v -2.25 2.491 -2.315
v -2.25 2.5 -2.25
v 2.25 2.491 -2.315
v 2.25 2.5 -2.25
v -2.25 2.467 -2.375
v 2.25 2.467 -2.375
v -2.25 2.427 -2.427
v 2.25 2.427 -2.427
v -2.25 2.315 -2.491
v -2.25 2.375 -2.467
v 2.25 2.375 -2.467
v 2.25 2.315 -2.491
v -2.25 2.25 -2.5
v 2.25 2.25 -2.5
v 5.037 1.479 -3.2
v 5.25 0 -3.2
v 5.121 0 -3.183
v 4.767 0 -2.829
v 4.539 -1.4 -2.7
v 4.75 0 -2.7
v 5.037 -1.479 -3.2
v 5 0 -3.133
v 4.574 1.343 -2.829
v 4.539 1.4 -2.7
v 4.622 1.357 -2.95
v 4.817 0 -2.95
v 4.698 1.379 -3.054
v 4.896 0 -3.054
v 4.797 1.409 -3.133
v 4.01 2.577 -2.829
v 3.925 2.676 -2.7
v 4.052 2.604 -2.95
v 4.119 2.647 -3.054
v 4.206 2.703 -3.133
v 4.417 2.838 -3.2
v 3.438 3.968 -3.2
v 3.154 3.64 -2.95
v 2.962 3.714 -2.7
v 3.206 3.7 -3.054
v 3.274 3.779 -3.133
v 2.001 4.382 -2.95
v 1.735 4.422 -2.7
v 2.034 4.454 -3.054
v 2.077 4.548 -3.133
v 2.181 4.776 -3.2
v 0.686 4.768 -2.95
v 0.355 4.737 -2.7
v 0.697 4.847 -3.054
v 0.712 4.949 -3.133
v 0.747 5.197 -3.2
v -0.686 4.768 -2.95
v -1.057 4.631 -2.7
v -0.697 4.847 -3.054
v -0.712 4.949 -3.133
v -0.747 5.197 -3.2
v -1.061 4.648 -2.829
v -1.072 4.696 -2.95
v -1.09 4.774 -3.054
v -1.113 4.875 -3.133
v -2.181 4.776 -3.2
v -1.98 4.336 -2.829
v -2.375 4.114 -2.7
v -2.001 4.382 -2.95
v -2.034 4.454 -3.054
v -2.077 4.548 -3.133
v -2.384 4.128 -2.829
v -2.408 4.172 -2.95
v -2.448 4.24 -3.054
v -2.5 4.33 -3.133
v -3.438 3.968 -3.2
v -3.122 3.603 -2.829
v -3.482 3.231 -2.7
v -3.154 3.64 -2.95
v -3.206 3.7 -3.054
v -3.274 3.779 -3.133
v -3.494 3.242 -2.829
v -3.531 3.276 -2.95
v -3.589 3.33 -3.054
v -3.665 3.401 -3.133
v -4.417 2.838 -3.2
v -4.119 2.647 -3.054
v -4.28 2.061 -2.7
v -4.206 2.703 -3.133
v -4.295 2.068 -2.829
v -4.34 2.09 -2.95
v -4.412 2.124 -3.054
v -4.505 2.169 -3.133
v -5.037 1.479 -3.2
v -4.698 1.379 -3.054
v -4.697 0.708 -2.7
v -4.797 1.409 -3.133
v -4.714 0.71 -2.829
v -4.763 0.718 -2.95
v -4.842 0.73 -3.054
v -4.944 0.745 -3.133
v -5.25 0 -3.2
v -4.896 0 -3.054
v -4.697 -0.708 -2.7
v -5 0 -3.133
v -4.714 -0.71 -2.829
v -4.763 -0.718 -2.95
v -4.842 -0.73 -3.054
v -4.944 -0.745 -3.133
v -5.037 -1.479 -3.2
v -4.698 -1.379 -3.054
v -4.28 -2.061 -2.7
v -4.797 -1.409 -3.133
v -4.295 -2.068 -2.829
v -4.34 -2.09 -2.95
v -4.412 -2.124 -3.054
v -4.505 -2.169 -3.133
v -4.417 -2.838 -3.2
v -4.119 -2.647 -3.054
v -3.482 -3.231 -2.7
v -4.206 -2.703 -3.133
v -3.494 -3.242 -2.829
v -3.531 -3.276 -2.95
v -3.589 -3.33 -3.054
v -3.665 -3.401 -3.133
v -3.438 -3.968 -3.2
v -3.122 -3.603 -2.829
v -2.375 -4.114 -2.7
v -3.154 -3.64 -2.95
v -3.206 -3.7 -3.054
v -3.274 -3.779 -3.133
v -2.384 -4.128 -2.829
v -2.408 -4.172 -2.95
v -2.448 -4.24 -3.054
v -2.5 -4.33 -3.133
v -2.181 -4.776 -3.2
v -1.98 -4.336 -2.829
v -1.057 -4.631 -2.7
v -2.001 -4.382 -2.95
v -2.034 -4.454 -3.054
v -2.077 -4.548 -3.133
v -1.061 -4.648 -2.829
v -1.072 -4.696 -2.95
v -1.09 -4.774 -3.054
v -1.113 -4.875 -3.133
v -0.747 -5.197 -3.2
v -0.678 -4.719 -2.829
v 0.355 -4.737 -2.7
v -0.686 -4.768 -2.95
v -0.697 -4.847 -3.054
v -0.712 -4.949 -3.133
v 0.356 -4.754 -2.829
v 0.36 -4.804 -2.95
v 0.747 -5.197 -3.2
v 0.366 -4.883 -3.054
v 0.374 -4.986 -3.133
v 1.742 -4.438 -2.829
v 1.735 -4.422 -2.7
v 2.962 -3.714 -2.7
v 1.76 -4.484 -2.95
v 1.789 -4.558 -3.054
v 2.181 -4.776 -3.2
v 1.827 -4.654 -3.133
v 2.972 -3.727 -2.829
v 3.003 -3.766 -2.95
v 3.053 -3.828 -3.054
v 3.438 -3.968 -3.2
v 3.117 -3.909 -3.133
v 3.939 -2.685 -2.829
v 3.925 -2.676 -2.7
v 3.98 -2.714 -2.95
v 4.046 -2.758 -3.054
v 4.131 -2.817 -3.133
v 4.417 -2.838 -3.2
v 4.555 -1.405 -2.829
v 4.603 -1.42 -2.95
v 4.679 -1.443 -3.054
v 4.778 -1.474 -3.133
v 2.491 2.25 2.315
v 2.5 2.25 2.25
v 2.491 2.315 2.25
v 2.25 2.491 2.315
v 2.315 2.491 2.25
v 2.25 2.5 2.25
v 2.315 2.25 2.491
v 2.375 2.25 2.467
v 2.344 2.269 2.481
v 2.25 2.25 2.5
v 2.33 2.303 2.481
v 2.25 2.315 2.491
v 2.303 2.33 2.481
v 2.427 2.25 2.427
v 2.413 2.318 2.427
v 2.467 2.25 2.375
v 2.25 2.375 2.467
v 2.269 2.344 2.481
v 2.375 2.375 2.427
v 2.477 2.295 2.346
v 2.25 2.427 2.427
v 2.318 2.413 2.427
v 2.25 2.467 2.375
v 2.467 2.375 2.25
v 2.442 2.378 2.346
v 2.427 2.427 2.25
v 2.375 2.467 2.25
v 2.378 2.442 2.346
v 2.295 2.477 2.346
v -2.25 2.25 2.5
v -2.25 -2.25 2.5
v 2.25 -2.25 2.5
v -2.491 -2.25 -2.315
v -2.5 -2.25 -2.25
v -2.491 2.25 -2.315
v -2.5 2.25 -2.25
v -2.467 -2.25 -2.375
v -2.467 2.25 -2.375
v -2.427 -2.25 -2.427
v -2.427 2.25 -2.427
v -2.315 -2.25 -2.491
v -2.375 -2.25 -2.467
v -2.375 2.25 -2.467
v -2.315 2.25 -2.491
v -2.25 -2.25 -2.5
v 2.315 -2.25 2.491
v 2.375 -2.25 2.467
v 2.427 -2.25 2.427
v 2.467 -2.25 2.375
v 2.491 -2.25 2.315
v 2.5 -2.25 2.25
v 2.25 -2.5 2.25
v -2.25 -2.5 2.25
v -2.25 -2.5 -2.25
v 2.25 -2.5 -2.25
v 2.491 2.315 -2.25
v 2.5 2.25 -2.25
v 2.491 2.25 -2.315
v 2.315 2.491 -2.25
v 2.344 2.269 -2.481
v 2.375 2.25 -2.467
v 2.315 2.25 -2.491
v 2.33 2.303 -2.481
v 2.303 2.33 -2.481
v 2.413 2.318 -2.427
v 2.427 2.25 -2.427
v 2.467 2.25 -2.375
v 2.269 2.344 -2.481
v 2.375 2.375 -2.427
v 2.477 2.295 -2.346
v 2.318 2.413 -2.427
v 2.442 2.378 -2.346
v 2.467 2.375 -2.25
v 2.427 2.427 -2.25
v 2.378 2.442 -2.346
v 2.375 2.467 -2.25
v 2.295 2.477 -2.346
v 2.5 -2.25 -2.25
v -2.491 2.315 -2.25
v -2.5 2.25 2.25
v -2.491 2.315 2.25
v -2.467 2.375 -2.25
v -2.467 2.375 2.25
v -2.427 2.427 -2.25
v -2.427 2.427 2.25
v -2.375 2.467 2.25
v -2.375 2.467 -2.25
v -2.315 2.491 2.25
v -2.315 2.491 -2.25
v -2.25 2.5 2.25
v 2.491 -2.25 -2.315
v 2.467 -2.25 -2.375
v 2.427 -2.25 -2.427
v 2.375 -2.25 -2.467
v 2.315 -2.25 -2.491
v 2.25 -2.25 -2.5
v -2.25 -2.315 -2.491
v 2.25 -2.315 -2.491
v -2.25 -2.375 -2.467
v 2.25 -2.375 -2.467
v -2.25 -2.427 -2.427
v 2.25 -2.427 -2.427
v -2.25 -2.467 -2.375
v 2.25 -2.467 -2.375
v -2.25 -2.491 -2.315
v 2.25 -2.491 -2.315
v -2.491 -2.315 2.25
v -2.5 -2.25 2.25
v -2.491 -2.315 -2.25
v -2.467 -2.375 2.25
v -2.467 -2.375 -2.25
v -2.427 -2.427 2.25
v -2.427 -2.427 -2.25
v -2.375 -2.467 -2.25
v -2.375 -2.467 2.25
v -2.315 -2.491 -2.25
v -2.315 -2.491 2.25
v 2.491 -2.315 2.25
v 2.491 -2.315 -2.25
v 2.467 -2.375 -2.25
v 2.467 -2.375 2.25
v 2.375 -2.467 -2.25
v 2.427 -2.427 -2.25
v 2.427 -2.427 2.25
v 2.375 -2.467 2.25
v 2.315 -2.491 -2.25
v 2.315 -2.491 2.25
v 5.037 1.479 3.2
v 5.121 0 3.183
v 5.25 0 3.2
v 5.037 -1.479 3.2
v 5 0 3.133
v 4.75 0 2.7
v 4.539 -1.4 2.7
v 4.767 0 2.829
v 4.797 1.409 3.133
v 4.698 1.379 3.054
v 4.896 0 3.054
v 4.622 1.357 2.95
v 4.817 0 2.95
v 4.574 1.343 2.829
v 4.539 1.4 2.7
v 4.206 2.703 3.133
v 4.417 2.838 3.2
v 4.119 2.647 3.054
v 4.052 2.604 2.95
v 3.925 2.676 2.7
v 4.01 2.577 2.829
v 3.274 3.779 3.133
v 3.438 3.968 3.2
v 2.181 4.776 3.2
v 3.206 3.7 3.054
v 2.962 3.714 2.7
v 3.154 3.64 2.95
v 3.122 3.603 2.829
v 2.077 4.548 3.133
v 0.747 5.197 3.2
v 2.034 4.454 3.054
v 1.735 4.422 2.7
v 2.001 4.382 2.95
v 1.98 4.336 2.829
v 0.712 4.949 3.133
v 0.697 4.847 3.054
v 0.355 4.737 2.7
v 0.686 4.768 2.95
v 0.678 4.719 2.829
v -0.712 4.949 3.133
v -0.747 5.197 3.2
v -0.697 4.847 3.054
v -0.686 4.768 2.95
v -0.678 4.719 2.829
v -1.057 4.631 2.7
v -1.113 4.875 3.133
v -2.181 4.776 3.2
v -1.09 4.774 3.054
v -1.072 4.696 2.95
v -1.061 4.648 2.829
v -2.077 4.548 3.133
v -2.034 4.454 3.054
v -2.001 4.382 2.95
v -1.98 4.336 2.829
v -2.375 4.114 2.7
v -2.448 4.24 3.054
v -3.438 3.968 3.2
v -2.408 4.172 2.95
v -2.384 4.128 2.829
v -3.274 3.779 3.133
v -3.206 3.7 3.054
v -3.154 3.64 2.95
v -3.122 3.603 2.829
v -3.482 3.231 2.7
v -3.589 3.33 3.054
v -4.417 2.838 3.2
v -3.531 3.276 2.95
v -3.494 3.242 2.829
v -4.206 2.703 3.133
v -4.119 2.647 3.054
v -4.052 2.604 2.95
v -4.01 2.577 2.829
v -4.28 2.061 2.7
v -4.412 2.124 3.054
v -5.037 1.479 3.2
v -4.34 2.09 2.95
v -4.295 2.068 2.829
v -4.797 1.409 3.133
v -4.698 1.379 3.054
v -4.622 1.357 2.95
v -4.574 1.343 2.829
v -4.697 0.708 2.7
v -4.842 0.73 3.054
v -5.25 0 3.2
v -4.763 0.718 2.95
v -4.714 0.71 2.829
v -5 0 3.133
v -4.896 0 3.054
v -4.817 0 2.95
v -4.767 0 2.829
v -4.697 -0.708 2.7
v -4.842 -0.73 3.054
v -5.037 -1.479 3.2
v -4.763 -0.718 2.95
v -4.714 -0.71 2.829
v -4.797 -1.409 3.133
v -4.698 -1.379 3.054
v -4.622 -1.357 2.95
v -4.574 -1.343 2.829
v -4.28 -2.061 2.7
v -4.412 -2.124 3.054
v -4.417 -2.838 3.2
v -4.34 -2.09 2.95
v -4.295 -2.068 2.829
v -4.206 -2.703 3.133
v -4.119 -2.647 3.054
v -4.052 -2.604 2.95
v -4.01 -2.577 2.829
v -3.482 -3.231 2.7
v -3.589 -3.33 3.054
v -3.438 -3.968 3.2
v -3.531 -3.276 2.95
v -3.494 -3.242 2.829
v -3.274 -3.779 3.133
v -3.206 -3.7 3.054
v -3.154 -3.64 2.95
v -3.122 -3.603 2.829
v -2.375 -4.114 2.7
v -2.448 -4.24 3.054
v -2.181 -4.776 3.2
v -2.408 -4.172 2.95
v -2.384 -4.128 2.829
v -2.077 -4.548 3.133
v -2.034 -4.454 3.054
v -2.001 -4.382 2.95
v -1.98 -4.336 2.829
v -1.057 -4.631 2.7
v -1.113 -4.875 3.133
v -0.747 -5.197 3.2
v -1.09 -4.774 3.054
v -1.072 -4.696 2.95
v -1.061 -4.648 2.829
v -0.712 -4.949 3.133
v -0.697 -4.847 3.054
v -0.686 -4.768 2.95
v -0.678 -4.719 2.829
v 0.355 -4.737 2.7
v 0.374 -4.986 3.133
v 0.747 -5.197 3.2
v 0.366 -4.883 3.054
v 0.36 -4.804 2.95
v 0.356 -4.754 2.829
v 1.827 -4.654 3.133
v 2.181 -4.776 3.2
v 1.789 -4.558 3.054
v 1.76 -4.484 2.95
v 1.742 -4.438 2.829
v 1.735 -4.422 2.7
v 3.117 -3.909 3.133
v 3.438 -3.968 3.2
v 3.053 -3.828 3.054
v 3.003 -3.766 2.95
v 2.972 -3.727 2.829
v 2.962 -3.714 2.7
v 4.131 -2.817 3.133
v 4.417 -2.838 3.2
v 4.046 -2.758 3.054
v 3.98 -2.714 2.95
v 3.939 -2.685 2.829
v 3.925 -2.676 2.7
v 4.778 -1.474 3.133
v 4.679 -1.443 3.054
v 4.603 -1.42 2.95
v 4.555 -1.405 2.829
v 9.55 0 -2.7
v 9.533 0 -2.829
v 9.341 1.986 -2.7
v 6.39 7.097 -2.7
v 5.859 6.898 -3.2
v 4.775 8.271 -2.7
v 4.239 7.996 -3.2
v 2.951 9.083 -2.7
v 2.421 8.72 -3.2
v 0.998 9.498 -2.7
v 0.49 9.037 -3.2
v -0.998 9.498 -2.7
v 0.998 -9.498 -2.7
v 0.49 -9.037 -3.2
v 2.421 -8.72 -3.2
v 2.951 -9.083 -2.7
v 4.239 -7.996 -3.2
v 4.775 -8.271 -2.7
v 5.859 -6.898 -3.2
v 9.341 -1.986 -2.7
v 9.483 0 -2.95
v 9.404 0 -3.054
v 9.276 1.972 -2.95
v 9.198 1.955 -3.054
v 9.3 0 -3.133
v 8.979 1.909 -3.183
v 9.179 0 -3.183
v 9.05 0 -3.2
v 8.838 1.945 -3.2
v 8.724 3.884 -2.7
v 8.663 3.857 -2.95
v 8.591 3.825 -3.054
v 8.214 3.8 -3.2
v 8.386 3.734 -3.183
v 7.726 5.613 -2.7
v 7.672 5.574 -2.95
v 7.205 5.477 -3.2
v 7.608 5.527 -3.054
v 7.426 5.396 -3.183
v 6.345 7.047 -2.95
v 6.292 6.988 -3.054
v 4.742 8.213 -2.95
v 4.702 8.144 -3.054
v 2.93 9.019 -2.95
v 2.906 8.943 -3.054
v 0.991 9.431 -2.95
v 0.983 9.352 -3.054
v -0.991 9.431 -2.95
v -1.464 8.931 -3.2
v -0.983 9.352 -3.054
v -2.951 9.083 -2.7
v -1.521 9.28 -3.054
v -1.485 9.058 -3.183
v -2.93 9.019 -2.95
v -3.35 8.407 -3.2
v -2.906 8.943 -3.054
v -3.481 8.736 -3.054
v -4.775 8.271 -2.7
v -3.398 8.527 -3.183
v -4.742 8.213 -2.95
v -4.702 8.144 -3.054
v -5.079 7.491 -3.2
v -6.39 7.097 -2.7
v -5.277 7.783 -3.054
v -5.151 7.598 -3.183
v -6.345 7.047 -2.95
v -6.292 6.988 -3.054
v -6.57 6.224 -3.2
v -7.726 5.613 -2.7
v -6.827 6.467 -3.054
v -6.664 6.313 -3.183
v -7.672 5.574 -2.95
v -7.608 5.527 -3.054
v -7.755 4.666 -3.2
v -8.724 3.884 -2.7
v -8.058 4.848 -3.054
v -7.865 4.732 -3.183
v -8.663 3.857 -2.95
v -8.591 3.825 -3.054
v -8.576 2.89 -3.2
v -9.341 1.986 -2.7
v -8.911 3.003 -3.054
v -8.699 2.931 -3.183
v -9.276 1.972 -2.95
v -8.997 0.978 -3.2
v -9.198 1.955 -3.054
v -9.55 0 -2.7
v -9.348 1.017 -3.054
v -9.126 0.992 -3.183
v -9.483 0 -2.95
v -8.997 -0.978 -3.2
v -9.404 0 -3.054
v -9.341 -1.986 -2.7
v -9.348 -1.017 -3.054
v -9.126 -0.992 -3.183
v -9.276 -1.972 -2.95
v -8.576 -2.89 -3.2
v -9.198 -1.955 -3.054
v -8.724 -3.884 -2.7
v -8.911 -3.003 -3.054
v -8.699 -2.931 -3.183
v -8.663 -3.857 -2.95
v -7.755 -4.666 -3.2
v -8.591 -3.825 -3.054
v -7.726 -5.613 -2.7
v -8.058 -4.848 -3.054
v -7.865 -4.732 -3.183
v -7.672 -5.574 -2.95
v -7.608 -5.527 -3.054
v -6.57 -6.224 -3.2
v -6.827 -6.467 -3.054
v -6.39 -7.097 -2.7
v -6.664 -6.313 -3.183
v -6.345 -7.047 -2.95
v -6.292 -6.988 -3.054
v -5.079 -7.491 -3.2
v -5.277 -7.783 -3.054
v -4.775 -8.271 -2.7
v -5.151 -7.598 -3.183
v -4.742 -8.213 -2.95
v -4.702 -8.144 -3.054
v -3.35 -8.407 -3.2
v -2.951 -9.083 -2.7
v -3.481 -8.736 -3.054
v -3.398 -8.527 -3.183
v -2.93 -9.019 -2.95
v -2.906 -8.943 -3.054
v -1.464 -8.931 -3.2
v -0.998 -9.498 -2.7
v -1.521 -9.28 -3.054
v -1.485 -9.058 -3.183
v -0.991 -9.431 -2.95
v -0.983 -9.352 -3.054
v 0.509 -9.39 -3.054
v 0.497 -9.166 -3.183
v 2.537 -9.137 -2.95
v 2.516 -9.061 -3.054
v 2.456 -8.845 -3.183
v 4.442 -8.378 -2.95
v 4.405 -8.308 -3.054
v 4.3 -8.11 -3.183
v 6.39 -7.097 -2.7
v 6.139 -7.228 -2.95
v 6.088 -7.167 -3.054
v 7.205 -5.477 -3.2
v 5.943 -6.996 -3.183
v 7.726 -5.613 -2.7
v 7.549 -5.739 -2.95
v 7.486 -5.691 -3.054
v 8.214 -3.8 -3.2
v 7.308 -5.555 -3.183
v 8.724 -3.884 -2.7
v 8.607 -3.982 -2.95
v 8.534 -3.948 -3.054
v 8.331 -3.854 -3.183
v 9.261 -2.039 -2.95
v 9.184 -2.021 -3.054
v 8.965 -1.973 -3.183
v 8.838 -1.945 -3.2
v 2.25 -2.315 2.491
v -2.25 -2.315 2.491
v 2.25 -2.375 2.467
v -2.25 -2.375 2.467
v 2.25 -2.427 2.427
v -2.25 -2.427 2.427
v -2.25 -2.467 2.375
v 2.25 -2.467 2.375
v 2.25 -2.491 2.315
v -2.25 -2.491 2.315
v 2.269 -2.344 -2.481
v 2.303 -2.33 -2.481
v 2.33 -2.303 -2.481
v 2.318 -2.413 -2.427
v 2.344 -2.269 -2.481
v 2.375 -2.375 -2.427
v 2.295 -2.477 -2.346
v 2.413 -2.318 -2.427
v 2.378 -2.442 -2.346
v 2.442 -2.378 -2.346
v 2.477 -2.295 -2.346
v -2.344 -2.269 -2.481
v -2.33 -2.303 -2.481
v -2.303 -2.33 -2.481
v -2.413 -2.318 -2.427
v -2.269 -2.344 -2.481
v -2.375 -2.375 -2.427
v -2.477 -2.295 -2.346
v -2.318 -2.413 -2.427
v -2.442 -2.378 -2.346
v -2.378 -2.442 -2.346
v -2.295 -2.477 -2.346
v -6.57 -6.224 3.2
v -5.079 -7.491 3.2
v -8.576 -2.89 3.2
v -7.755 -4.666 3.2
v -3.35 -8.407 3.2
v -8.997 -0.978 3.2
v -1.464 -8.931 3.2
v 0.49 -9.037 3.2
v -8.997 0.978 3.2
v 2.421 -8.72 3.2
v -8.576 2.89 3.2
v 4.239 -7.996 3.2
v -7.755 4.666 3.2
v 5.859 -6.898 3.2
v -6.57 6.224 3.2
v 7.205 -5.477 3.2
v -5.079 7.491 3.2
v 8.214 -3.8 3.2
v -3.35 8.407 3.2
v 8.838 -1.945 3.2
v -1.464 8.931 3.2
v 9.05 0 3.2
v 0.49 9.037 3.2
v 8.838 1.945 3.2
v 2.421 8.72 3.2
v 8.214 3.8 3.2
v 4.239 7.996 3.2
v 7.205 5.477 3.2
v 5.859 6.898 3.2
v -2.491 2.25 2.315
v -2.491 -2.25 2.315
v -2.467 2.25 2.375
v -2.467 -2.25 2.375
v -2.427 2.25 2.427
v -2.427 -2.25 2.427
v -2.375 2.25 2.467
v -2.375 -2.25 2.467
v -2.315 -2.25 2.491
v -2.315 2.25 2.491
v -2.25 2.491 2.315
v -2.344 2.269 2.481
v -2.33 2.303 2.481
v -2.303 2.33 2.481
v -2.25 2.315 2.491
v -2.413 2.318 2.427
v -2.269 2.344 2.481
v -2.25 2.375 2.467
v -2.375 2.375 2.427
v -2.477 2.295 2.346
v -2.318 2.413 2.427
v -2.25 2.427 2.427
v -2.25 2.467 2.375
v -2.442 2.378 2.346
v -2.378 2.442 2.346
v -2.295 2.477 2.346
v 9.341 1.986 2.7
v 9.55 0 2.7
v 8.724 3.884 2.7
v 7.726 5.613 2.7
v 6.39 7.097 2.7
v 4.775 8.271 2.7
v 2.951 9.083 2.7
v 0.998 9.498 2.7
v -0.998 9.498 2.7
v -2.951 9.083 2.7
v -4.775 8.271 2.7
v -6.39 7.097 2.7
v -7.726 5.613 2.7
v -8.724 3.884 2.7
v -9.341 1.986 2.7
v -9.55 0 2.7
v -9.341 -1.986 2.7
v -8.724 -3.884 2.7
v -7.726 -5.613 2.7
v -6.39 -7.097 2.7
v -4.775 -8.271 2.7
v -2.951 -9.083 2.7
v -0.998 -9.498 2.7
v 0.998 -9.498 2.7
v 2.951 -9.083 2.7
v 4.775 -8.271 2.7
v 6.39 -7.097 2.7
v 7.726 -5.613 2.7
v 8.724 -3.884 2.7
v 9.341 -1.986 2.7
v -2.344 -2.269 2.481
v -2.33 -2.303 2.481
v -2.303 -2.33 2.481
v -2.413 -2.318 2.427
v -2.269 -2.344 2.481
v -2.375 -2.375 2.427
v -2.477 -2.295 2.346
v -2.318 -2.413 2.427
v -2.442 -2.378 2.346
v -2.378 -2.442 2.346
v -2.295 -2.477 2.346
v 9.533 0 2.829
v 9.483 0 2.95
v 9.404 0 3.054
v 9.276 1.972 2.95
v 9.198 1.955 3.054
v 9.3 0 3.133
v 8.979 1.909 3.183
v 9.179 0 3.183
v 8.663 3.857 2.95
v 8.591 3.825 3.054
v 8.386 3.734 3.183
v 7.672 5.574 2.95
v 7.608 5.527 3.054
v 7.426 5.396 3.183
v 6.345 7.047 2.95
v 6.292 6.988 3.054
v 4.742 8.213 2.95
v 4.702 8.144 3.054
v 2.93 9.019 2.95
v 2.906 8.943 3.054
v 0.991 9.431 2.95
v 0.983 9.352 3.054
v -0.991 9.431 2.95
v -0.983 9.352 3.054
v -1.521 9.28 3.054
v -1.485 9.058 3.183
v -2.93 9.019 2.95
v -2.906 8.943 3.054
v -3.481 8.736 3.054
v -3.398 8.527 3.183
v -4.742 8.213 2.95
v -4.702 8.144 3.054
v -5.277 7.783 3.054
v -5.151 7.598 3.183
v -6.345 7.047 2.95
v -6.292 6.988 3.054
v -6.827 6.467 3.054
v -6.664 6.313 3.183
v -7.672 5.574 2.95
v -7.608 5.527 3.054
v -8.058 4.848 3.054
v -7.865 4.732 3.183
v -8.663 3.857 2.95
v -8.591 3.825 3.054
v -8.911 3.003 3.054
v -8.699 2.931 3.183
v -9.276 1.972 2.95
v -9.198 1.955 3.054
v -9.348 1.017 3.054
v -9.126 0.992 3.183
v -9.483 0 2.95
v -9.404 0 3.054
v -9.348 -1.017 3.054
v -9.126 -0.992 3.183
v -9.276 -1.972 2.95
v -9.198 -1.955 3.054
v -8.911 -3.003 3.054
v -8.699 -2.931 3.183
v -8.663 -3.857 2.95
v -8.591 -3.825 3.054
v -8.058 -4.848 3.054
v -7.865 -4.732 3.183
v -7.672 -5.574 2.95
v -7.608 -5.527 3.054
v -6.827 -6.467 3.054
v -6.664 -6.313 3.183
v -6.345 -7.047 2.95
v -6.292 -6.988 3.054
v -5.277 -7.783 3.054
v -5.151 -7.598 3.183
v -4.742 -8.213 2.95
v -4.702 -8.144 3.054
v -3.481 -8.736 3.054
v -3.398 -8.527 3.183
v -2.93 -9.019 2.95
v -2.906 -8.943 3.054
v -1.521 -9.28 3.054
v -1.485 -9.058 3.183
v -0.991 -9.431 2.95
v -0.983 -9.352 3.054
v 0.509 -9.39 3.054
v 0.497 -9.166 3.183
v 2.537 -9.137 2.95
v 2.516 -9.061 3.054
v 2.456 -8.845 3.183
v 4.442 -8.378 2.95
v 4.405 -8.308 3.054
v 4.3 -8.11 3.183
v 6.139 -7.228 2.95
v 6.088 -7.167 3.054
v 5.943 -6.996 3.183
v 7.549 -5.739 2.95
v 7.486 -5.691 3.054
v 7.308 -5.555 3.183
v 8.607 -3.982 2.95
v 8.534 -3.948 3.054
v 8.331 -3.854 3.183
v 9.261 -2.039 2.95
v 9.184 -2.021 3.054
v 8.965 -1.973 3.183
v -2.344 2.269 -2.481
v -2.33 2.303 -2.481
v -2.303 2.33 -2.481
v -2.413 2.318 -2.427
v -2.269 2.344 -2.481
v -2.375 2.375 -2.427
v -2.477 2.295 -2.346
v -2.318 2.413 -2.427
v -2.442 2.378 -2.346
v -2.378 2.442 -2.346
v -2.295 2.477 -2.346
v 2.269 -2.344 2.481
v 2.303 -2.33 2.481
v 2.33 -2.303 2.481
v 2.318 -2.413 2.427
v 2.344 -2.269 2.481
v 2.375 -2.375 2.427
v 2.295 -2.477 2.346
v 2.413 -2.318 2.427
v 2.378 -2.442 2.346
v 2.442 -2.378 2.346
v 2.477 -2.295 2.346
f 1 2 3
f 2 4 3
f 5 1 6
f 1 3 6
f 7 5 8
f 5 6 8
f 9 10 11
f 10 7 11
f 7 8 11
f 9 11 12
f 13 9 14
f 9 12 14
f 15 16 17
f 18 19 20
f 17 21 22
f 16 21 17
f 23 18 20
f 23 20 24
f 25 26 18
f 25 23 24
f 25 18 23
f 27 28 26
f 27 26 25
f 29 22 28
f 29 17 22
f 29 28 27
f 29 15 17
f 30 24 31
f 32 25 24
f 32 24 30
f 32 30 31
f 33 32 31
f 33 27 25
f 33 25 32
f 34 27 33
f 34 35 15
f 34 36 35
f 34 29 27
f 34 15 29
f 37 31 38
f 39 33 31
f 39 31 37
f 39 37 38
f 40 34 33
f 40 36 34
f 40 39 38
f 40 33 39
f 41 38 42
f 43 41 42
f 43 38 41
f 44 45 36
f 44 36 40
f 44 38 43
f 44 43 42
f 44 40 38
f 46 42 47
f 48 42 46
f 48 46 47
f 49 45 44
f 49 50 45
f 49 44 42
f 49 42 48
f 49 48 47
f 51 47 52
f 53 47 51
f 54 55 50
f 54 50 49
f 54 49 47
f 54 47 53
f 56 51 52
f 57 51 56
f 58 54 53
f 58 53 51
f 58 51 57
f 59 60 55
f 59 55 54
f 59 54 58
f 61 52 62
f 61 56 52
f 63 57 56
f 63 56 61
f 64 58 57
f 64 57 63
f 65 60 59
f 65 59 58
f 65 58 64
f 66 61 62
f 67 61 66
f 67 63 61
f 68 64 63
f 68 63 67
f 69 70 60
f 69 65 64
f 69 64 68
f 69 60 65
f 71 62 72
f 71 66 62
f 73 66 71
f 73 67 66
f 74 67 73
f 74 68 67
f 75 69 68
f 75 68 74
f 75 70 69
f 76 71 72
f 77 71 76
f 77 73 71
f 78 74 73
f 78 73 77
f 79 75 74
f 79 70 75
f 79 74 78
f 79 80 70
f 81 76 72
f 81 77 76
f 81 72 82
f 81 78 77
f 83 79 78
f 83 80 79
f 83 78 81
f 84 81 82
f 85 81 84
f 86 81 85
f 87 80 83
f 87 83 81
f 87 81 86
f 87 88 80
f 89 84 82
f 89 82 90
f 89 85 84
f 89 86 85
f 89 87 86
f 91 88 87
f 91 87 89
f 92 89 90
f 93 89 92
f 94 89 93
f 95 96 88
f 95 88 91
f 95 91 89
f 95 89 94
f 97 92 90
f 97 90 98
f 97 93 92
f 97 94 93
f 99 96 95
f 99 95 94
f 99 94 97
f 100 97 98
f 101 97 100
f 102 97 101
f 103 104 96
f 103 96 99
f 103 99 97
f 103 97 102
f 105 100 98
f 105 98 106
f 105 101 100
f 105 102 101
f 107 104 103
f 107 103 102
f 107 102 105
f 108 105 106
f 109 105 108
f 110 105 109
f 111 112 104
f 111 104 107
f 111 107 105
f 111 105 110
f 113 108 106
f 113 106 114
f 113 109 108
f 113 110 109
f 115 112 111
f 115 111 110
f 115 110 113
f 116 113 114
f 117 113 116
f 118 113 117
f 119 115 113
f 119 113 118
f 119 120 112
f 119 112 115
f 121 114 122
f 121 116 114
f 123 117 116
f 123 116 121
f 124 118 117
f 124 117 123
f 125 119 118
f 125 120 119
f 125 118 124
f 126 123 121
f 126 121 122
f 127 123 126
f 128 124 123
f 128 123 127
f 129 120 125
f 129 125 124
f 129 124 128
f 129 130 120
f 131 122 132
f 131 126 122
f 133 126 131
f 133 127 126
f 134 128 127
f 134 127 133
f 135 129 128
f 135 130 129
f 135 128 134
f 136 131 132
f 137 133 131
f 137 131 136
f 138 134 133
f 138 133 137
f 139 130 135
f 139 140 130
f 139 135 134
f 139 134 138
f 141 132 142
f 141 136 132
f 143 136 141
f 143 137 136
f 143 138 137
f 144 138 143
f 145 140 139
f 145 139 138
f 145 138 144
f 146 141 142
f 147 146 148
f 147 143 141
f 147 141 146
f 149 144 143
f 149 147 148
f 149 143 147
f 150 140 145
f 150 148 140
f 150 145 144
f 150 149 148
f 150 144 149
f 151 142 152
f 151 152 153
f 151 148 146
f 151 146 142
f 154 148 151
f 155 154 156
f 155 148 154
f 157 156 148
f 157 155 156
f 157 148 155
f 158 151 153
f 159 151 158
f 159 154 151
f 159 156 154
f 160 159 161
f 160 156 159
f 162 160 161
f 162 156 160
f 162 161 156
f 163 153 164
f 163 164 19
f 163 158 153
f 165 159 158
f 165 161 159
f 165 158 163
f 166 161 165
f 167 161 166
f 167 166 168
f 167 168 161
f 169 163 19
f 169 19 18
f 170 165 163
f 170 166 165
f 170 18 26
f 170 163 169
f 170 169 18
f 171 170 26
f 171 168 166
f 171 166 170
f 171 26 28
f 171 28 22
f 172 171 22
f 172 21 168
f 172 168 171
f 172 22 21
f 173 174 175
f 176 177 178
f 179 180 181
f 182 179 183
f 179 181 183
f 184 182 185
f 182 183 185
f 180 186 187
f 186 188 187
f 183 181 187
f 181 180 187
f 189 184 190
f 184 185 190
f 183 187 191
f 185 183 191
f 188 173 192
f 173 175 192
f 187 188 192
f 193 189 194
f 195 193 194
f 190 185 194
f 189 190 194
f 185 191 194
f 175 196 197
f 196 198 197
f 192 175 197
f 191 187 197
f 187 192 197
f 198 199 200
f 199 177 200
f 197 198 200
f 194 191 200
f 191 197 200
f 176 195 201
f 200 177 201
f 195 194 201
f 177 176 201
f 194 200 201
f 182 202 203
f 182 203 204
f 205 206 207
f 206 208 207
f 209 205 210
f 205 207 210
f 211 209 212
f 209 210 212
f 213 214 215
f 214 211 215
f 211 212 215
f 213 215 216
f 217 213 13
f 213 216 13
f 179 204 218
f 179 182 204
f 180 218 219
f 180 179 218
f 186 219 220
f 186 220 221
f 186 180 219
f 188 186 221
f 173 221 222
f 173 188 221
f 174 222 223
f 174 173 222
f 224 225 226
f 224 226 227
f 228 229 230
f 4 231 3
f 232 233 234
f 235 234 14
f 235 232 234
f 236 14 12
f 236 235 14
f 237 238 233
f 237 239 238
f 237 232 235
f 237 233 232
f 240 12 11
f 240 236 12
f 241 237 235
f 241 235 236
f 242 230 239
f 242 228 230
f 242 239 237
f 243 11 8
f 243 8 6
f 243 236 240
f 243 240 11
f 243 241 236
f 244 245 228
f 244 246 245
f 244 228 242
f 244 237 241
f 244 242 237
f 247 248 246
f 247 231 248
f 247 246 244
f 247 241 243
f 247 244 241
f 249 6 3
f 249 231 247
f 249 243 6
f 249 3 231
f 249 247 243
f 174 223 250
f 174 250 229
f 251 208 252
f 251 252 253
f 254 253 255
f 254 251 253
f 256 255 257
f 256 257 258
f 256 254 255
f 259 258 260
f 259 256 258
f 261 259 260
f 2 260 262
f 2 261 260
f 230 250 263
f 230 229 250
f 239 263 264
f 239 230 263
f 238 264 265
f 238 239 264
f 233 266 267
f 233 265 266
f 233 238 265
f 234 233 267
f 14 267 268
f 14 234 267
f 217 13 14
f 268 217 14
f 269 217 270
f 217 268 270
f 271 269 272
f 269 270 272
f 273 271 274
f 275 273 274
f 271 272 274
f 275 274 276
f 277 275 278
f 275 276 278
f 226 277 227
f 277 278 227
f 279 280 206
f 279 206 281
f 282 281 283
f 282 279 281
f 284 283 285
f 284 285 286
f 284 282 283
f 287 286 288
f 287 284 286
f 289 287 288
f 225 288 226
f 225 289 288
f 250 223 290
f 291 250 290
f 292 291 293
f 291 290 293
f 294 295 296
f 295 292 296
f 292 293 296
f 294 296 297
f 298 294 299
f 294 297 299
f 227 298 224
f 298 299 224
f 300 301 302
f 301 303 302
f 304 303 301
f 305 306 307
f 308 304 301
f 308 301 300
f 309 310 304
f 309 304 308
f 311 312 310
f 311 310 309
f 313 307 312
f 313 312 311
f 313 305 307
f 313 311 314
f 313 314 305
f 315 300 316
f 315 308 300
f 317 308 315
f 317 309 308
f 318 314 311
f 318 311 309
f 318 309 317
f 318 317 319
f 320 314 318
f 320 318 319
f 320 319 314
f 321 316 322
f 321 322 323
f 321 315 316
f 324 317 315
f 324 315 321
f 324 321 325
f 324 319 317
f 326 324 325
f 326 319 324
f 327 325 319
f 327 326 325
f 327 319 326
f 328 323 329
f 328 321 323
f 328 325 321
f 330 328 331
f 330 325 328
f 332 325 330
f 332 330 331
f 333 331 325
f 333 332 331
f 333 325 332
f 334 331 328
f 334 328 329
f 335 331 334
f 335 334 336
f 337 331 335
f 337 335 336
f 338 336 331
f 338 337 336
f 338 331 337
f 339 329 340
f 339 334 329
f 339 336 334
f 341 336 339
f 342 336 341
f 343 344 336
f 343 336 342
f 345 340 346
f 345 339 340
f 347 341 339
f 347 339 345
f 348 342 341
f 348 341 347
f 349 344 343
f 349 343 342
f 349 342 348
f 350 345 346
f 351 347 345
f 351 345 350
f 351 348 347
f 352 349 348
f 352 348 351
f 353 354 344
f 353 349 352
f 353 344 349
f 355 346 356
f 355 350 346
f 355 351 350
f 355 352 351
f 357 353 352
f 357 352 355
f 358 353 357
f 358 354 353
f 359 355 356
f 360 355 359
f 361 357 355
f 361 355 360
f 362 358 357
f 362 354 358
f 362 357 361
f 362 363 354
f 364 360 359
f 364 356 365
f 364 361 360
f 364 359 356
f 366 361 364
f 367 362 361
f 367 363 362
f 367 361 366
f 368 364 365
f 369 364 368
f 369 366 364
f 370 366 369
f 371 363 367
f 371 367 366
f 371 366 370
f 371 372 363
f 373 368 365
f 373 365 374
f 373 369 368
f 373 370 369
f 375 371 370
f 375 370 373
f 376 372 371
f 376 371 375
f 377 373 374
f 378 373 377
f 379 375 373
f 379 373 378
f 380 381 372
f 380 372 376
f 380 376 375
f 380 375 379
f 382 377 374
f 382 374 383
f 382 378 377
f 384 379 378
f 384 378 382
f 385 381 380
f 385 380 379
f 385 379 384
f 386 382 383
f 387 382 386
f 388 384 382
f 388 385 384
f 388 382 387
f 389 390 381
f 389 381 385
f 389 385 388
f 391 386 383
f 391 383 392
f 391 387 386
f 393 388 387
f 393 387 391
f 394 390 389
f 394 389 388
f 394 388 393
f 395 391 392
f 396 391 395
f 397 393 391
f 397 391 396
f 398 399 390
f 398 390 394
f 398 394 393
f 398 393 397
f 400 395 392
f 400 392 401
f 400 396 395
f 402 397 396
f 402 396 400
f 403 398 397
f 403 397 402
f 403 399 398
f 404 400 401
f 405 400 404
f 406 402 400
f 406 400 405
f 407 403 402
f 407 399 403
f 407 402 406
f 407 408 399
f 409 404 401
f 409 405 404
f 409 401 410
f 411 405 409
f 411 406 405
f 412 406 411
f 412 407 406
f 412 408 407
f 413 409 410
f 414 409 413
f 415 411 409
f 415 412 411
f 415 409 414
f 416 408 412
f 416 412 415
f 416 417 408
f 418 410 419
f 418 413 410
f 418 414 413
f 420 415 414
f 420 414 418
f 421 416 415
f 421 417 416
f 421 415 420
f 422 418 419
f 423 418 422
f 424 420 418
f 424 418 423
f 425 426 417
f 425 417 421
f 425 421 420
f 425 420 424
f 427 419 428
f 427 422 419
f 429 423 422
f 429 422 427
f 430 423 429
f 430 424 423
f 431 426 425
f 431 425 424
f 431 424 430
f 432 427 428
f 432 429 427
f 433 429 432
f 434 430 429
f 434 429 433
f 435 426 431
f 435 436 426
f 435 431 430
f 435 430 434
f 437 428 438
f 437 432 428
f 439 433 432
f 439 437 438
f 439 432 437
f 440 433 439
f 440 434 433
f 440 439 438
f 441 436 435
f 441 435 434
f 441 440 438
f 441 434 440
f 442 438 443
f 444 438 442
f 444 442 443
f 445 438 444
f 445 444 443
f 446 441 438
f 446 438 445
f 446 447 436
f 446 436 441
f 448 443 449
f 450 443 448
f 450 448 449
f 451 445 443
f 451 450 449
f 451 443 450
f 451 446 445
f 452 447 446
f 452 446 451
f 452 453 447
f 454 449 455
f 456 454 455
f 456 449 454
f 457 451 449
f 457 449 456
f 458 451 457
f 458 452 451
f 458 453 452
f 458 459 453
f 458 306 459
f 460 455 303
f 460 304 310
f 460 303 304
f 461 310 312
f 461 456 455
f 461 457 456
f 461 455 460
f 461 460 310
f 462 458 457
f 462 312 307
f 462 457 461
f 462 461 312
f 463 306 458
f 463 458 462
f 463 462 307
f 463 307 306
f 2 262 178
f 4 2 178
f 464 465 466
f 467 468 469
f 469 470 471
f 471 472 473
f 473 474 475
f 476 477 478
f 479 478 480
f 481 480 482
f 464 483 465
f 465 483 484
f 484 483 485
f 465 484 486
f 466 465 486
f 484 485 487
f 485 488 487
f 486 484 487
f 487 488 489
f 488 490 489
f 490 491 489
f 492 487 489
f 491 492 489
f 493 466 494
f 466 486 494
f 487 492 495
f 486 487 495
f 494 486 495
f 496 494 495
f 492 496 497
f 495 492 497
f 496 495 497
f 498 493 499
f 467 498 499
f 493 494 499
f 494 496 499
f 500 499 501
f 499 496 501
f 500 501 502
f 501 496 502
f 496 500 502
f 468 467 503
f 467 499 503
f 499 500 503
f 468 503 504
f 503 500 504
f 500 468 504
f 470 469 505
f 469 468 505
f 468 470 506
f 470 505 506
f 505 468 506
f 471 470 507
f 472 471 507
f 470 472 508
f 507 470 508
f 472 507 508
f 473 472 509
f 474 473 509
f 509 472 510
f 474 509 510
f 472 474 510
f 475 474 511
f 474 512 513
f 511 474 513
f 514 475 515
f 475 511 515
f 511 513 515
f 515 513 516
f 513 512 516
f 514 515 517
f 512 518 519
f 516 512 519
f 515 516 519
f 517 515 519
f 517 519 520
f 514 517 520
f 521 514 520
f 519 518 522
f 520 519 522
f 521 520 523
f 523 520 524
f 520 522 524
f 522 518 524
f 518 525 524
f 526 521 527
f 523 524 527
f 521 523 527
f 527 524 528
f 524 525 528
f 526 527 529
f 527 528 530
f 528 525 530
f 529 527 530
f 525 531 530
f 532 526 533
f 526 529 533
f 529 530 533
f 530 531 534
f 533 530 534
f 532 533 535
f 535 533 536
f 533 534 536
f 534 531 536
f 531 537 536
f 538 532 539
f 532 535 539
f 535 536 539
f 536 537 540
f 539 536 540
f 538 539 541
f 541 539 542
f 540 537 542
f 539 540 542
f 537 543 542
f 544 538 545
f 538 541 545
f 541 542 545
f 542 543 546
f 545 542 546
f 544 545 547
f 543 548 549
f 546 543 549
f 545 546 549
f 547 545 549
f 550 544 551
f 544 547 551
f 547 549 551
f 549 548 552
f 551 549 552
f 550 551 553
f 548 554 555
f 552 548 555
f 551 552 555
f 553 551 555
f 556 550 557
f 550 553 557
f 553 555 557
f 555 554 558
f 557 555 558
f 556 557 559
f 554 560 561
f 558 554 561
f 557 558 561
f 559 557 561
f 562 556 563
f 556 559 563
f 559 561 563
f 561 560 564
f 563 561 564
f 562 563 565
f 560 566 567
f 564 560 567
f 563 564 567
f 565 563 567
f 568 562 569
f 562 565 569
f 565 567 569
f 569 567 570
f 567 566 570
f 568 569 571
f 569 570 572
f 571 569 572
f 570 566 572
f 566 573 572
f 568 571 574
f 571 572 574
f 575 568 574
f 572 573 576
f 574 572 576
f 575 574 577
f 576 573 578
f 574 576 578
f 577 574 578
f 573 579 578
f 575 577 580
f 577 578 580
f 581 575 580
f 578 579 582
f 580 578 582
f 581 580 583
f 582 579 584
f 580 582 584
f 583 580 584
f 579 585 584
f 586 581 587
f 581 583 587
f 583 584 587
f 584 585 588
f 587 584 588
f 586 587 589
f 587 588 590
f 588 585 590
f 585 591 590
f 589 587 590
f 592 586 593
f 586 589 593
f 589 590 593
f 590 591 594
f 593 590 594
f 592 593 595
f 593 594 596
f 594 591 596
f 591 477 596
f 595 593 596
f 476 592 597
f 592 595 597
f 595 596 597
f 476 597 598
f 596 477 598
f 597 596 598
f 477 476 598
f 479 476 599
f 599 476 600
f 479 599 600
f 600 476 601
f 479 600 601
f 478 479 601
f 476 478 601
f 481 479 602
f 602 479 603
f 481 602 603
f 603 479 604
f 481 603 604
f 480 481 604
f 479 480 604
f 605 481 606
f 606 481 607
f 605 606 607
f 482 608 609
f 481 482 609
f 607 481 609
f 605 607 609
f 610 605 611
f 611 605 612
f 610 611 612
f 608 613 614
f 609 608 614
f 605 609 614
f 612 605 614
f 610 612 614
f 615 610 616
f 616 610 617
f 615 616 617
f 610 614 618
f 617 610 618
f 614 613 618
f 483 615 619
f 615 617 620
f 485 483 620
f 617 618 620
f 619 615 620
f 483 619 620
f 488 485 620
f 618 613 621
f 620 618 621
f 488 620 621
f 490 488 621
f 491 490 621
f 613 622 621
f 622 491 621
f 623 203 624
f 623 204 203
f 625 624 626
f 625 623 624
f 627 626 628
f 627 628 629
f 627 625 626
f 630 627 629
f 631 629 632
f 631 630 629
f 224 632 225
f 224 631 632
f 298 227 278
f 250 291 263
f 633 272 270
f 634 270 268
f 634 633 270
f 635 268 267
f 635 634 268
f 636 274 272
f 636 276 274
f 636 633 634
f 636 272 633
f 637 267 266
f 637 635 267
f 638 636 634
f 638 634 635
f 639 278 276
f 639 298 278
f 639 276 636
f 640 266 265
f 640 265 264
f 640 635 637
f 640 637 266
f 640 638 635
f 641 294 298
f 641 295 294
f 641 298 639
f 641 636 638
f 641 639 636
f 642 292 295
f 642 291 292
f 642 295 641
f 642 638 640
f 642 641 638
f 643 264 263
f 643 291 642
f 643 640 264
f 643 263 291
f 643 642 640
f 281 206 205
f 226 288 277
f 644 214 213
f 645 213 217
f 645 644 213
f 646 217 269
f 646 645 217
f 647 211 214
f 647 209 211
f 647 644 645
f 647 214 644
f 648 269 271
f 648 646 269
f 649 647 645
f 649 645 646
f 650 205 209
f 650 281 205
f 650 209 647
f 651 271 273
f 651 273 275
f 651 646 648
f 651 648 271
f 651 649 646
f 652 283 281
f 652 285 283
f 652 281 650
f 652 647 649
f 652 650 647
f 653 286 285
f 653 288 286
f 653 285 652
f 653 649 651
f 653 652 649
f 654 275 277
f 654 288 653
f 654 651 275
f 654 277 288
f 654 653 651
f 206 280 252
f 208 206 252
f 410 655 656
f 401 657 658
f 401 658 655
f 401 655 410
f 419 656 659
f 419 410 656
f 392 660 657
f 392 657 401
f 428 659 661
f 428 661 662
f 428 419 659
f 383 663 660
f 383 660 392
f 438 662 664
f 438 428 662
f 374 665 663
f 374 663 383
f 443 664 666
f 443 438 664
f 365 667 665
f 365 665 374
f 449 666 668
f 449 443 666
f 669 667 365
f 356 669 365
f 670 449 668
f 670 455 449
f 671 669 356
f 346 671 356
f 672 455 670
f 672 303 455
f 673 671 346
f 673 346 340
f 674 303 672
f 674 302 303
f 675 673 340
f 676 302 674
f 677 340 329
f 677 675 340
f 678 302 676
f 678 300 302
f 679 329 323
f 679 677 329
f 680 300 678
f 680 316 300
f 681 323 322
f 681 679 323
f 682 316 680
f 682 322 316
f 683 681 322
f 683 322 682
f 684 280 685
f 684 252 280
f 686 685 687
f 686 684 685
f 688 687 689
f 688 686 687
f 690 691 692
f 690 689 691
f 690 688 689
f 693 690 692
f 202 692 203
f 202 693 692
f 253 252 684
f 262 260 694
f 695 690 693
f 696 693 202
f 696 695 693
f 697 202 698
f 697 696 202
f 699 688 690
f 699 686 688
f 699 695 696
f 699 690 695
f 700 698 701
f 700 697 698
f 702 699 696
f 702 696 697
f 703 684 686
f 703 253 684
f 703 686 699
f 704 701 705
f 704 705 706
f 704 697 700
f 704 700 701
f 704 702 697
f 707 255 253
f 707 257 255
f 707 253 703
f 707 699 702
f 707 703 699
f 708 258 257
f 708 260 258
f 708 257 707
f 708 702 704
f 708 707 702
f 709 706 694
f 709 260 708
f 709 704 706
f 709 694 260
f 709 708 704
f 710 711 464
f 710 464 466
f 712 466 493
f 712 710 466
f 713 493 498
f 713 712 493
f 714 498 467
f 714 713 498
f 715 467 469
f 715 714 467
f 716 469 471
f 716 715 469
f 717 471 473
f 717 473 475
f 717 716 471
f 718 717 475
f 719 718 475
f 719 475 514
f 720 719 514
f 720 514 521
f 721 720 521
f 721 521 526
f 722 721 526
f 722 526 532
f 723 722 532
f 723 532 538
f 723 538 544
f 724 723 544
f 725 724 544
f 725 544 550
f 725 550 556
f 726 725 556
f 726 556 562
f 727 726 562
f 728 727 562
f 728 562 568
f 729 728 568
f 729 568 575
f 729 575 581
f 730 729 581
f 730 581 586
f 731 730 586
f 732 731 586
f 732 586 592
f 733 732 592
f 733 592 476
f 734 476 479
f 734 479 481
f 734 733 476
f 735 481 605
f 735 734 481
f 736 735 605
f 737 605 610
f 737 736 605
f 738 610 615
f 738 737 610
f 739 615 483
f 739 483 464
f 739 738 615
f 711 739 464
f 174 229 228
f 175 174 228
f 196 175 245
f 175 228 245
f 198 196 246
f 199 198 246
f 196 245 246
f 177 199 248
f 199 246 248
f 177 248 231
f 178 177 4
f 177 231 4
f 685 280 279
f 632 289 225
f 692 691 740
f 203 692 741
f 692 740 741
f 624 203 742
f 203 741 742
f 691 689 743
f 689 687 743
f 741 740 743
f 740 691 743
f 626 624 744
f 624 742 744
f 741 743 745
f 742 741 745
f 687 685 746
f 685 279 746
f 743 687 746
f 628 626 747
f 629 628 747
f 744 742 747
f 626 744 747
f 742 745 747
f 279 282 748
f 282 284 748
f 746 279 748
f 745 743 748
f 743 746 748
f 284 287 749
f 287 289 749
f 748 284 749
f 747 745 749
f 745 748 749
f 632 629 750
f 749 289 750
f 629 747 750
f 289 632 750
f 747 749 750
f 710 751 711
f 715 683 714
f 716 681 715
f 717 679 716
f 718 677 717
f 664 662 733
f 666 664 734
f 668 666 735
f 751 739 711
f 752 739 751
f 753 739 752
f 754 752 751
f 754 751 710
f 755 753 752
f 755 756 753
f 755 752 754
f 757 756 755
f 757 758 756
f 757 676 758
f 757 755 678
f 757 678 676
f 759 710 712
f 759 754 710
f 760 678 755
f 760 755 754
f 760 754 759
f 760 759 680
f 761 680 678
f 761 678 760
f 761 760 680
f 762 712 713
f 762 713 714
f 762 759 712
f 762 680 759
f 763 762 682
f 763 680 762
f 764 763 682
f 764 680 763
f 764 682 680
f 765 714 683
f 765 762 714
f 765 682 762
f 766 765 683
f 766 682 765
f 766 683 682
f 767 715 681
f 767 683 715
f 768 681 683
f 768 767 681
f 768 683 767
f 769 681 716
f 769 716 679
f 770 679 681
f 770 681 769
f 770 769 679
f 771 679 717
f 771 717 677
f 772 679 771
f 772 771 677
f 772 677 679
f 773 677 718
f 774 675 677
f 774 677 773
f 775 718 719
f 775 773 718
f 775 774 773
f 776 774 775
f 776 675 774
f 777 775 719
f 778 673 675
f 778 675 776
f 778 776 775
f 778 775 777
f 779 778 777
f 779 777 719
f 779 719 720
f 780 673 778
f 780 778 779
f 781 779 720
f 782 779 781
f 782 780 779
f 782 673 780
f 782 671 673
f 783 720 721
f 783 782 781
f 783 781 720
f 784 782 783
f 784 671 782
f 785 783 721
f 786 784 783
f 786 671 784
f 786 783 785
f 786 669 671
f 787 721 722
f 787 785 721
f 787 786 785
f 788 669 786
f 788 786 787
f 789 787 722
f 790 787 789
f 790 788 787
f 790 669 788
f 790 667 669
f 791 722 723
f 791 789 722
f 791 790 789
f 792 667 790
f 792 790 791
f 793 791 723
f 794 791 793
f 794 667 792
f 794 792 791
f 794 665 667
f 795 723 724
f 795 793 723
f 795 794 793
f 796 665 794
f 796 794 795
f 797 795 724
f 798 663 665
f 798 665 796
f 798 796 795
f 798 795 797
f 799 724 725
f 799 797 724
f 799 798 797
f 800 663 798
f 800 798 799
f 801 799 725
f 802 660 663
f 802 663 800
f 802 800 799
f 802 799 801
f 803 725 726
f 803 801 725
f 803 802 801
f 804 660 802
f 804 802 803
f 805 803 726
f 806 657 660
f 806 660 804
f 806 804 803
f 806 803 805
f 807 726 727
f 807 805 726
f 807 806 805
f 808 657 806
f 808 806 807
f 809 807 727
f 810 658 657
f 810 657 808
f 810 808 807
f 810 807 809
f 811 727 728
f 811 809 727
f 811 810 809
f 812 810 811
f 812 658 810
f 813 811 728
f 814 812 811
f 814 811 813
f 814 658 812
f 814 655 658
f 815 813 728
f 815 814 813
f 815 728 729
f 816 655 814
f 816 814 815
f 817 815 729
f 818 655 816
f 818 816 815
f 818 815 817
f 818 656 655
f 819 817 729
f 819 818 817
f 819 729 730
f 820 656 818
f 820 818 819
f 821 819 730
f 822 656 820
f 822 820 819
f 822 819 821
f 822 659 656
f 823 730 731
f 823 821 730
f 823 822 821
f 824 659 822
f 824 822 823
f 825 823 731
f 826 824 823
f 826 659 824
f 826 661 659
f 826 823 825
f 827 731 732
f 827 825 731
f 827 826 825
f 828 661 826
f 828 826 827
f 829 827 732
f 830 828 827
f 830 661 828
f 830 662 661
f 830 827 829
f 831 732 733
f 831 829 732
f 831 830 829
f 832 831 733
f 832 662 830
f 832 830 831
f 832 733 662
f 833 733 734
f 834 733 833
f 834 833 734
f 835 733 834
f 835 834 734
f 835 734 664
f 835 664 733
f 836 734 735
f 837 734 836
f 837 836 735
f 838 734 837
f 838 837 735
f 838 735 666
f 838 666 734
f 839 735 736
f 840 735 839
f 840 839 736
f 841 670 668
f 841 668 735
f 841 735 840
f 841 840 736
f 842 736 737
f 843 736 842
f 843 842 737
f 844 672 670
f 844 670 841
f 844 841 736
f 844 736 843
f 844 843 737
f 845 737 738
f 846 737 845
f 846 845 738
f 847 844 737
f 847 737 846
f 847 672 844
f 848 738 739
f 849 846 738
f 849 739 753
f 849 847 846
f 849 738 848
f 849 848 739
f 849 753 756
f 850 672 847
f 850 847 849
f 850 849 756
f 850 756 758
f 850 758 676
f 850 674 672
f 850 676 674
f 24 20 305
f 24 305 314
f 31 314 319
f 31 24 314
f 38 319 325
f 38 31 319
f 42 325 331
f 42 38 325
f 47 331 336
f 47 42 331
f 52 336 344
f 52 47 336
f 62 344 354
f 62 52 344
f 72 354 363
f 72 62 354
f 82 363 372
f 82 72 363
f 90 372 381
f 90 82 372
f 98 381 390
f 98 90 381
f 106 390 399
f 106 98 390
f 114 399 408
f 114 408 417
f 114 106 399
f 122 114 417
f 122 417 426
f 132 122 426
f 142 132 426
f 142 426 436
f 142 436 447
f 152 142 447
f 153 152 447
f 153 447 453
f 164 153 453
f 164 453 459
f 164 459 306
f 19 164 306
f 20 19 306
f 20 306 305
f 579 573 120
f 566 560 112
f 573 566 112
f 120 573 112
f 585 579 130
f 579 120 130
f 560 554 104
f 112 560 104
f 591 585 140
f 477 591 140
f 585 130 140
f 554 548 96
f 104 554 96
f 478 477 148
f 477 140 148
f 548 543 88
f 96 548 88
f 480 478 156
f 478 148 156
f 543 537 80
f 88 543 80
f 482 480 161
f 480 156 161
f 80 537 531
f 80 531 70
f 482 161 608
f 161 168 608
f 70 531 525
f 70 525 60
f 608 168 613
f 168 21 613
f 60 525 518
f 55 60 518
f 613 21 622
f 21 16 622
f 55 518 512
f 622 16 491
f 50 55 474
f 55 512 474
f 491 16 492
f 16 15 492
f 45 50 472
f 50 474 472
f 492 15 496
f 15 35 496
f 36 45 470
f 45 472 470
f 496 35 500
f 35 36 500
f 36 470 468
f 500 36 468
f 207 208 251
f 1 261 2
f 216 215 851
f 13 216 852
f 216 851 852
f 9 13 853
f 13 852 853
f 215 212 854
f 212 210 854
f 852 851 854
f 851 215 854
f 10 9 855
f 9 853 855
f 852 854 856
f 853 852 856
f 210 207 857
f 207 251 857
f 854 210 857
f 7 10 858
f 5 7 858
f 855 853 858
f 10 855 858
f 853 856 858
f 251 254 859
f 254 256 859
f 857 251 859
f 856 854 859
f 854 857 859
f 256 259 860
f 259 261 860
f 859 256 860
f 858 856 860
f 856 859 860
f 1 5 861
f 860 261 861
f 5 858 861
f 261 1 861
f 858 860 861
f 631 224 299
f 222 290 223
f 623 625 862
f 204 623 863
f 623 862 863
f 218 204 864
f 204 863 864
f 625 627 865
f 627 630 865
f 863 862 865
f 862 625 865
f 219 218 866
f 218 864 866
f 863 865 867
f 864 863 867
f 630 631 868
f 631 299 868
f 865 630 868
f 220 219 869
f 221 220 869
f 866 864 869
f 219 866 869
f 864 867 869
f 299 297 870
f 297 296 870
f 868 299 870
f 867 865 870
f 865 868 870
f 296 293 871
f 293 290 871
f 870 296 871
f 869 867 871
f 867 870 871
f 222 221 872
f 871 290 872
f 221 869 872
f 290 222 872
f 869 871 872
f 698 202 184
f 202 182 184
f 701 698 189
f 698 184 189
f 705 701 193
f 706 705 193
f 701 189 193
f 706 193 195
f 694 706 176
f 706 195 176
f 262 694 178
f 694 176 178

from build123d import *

# Parameters (mm, degrees)
F0_W     = 5
F0_H     = 5
F1_DEPTH = 2.5
F2_R     = 0.25
F3_R     = 9.55
F3_R_2   = 4.75
F4_DEPTH = 3.2
F5_R     = 0.5


with BuildPart() as f1:
    # F0 (on Top) → F1 (new body, symmetric)
    with BuildSketch(Plane.XY):
        Rectangle(F0_W, F0_H)
    extrude(amount=F1_DEPTH, both=True)

    # F2
    f2_edges = [f1.edges().sort_by_distance(p)[0] for p in [
        (2.5, 2.5, 0),
        (2.5, -2.5, 0),
        (-2.5, -2.5, 0),
        (-2.5, 2.5, 0),
        (-2.5, 0, 2.5),
        (-2.5, 0, -2.5),
        (0, -2.5, 2.5),
        (2.5, 0, 2.5),
        (0, 2.5, 2.5),
        (0, -2.5, -2.5),
        (2.5, 0, -2.5),
        (0, 2.5, -2.5),
    ]]
    fillet(f2_edges, radius=F2_R)


with BuildPart() as f4:
    # F3 (on Top) → F4 (new body, symmetric)
    with BuildSketch(Plane.XY):
        Circle(F3_R)
        Circle(F3_R_2, mode=Mode.SUBTRACT)
    extrude(amount=F4_DEPTH, both=True)

    # F5
    f5_edges = [f4.edges().sort_by_distance(p)[0] for p in [
        (-9.55, 0, 3.2),
        (-9.55, 0, -3.2),
        (-4.75, 0, 3.2),
        (-4.75, 0, -3.2),
    ]]
    fillet(f5_edges, radius=F5_R)


solid = Compound([f1.part, f4.part])
